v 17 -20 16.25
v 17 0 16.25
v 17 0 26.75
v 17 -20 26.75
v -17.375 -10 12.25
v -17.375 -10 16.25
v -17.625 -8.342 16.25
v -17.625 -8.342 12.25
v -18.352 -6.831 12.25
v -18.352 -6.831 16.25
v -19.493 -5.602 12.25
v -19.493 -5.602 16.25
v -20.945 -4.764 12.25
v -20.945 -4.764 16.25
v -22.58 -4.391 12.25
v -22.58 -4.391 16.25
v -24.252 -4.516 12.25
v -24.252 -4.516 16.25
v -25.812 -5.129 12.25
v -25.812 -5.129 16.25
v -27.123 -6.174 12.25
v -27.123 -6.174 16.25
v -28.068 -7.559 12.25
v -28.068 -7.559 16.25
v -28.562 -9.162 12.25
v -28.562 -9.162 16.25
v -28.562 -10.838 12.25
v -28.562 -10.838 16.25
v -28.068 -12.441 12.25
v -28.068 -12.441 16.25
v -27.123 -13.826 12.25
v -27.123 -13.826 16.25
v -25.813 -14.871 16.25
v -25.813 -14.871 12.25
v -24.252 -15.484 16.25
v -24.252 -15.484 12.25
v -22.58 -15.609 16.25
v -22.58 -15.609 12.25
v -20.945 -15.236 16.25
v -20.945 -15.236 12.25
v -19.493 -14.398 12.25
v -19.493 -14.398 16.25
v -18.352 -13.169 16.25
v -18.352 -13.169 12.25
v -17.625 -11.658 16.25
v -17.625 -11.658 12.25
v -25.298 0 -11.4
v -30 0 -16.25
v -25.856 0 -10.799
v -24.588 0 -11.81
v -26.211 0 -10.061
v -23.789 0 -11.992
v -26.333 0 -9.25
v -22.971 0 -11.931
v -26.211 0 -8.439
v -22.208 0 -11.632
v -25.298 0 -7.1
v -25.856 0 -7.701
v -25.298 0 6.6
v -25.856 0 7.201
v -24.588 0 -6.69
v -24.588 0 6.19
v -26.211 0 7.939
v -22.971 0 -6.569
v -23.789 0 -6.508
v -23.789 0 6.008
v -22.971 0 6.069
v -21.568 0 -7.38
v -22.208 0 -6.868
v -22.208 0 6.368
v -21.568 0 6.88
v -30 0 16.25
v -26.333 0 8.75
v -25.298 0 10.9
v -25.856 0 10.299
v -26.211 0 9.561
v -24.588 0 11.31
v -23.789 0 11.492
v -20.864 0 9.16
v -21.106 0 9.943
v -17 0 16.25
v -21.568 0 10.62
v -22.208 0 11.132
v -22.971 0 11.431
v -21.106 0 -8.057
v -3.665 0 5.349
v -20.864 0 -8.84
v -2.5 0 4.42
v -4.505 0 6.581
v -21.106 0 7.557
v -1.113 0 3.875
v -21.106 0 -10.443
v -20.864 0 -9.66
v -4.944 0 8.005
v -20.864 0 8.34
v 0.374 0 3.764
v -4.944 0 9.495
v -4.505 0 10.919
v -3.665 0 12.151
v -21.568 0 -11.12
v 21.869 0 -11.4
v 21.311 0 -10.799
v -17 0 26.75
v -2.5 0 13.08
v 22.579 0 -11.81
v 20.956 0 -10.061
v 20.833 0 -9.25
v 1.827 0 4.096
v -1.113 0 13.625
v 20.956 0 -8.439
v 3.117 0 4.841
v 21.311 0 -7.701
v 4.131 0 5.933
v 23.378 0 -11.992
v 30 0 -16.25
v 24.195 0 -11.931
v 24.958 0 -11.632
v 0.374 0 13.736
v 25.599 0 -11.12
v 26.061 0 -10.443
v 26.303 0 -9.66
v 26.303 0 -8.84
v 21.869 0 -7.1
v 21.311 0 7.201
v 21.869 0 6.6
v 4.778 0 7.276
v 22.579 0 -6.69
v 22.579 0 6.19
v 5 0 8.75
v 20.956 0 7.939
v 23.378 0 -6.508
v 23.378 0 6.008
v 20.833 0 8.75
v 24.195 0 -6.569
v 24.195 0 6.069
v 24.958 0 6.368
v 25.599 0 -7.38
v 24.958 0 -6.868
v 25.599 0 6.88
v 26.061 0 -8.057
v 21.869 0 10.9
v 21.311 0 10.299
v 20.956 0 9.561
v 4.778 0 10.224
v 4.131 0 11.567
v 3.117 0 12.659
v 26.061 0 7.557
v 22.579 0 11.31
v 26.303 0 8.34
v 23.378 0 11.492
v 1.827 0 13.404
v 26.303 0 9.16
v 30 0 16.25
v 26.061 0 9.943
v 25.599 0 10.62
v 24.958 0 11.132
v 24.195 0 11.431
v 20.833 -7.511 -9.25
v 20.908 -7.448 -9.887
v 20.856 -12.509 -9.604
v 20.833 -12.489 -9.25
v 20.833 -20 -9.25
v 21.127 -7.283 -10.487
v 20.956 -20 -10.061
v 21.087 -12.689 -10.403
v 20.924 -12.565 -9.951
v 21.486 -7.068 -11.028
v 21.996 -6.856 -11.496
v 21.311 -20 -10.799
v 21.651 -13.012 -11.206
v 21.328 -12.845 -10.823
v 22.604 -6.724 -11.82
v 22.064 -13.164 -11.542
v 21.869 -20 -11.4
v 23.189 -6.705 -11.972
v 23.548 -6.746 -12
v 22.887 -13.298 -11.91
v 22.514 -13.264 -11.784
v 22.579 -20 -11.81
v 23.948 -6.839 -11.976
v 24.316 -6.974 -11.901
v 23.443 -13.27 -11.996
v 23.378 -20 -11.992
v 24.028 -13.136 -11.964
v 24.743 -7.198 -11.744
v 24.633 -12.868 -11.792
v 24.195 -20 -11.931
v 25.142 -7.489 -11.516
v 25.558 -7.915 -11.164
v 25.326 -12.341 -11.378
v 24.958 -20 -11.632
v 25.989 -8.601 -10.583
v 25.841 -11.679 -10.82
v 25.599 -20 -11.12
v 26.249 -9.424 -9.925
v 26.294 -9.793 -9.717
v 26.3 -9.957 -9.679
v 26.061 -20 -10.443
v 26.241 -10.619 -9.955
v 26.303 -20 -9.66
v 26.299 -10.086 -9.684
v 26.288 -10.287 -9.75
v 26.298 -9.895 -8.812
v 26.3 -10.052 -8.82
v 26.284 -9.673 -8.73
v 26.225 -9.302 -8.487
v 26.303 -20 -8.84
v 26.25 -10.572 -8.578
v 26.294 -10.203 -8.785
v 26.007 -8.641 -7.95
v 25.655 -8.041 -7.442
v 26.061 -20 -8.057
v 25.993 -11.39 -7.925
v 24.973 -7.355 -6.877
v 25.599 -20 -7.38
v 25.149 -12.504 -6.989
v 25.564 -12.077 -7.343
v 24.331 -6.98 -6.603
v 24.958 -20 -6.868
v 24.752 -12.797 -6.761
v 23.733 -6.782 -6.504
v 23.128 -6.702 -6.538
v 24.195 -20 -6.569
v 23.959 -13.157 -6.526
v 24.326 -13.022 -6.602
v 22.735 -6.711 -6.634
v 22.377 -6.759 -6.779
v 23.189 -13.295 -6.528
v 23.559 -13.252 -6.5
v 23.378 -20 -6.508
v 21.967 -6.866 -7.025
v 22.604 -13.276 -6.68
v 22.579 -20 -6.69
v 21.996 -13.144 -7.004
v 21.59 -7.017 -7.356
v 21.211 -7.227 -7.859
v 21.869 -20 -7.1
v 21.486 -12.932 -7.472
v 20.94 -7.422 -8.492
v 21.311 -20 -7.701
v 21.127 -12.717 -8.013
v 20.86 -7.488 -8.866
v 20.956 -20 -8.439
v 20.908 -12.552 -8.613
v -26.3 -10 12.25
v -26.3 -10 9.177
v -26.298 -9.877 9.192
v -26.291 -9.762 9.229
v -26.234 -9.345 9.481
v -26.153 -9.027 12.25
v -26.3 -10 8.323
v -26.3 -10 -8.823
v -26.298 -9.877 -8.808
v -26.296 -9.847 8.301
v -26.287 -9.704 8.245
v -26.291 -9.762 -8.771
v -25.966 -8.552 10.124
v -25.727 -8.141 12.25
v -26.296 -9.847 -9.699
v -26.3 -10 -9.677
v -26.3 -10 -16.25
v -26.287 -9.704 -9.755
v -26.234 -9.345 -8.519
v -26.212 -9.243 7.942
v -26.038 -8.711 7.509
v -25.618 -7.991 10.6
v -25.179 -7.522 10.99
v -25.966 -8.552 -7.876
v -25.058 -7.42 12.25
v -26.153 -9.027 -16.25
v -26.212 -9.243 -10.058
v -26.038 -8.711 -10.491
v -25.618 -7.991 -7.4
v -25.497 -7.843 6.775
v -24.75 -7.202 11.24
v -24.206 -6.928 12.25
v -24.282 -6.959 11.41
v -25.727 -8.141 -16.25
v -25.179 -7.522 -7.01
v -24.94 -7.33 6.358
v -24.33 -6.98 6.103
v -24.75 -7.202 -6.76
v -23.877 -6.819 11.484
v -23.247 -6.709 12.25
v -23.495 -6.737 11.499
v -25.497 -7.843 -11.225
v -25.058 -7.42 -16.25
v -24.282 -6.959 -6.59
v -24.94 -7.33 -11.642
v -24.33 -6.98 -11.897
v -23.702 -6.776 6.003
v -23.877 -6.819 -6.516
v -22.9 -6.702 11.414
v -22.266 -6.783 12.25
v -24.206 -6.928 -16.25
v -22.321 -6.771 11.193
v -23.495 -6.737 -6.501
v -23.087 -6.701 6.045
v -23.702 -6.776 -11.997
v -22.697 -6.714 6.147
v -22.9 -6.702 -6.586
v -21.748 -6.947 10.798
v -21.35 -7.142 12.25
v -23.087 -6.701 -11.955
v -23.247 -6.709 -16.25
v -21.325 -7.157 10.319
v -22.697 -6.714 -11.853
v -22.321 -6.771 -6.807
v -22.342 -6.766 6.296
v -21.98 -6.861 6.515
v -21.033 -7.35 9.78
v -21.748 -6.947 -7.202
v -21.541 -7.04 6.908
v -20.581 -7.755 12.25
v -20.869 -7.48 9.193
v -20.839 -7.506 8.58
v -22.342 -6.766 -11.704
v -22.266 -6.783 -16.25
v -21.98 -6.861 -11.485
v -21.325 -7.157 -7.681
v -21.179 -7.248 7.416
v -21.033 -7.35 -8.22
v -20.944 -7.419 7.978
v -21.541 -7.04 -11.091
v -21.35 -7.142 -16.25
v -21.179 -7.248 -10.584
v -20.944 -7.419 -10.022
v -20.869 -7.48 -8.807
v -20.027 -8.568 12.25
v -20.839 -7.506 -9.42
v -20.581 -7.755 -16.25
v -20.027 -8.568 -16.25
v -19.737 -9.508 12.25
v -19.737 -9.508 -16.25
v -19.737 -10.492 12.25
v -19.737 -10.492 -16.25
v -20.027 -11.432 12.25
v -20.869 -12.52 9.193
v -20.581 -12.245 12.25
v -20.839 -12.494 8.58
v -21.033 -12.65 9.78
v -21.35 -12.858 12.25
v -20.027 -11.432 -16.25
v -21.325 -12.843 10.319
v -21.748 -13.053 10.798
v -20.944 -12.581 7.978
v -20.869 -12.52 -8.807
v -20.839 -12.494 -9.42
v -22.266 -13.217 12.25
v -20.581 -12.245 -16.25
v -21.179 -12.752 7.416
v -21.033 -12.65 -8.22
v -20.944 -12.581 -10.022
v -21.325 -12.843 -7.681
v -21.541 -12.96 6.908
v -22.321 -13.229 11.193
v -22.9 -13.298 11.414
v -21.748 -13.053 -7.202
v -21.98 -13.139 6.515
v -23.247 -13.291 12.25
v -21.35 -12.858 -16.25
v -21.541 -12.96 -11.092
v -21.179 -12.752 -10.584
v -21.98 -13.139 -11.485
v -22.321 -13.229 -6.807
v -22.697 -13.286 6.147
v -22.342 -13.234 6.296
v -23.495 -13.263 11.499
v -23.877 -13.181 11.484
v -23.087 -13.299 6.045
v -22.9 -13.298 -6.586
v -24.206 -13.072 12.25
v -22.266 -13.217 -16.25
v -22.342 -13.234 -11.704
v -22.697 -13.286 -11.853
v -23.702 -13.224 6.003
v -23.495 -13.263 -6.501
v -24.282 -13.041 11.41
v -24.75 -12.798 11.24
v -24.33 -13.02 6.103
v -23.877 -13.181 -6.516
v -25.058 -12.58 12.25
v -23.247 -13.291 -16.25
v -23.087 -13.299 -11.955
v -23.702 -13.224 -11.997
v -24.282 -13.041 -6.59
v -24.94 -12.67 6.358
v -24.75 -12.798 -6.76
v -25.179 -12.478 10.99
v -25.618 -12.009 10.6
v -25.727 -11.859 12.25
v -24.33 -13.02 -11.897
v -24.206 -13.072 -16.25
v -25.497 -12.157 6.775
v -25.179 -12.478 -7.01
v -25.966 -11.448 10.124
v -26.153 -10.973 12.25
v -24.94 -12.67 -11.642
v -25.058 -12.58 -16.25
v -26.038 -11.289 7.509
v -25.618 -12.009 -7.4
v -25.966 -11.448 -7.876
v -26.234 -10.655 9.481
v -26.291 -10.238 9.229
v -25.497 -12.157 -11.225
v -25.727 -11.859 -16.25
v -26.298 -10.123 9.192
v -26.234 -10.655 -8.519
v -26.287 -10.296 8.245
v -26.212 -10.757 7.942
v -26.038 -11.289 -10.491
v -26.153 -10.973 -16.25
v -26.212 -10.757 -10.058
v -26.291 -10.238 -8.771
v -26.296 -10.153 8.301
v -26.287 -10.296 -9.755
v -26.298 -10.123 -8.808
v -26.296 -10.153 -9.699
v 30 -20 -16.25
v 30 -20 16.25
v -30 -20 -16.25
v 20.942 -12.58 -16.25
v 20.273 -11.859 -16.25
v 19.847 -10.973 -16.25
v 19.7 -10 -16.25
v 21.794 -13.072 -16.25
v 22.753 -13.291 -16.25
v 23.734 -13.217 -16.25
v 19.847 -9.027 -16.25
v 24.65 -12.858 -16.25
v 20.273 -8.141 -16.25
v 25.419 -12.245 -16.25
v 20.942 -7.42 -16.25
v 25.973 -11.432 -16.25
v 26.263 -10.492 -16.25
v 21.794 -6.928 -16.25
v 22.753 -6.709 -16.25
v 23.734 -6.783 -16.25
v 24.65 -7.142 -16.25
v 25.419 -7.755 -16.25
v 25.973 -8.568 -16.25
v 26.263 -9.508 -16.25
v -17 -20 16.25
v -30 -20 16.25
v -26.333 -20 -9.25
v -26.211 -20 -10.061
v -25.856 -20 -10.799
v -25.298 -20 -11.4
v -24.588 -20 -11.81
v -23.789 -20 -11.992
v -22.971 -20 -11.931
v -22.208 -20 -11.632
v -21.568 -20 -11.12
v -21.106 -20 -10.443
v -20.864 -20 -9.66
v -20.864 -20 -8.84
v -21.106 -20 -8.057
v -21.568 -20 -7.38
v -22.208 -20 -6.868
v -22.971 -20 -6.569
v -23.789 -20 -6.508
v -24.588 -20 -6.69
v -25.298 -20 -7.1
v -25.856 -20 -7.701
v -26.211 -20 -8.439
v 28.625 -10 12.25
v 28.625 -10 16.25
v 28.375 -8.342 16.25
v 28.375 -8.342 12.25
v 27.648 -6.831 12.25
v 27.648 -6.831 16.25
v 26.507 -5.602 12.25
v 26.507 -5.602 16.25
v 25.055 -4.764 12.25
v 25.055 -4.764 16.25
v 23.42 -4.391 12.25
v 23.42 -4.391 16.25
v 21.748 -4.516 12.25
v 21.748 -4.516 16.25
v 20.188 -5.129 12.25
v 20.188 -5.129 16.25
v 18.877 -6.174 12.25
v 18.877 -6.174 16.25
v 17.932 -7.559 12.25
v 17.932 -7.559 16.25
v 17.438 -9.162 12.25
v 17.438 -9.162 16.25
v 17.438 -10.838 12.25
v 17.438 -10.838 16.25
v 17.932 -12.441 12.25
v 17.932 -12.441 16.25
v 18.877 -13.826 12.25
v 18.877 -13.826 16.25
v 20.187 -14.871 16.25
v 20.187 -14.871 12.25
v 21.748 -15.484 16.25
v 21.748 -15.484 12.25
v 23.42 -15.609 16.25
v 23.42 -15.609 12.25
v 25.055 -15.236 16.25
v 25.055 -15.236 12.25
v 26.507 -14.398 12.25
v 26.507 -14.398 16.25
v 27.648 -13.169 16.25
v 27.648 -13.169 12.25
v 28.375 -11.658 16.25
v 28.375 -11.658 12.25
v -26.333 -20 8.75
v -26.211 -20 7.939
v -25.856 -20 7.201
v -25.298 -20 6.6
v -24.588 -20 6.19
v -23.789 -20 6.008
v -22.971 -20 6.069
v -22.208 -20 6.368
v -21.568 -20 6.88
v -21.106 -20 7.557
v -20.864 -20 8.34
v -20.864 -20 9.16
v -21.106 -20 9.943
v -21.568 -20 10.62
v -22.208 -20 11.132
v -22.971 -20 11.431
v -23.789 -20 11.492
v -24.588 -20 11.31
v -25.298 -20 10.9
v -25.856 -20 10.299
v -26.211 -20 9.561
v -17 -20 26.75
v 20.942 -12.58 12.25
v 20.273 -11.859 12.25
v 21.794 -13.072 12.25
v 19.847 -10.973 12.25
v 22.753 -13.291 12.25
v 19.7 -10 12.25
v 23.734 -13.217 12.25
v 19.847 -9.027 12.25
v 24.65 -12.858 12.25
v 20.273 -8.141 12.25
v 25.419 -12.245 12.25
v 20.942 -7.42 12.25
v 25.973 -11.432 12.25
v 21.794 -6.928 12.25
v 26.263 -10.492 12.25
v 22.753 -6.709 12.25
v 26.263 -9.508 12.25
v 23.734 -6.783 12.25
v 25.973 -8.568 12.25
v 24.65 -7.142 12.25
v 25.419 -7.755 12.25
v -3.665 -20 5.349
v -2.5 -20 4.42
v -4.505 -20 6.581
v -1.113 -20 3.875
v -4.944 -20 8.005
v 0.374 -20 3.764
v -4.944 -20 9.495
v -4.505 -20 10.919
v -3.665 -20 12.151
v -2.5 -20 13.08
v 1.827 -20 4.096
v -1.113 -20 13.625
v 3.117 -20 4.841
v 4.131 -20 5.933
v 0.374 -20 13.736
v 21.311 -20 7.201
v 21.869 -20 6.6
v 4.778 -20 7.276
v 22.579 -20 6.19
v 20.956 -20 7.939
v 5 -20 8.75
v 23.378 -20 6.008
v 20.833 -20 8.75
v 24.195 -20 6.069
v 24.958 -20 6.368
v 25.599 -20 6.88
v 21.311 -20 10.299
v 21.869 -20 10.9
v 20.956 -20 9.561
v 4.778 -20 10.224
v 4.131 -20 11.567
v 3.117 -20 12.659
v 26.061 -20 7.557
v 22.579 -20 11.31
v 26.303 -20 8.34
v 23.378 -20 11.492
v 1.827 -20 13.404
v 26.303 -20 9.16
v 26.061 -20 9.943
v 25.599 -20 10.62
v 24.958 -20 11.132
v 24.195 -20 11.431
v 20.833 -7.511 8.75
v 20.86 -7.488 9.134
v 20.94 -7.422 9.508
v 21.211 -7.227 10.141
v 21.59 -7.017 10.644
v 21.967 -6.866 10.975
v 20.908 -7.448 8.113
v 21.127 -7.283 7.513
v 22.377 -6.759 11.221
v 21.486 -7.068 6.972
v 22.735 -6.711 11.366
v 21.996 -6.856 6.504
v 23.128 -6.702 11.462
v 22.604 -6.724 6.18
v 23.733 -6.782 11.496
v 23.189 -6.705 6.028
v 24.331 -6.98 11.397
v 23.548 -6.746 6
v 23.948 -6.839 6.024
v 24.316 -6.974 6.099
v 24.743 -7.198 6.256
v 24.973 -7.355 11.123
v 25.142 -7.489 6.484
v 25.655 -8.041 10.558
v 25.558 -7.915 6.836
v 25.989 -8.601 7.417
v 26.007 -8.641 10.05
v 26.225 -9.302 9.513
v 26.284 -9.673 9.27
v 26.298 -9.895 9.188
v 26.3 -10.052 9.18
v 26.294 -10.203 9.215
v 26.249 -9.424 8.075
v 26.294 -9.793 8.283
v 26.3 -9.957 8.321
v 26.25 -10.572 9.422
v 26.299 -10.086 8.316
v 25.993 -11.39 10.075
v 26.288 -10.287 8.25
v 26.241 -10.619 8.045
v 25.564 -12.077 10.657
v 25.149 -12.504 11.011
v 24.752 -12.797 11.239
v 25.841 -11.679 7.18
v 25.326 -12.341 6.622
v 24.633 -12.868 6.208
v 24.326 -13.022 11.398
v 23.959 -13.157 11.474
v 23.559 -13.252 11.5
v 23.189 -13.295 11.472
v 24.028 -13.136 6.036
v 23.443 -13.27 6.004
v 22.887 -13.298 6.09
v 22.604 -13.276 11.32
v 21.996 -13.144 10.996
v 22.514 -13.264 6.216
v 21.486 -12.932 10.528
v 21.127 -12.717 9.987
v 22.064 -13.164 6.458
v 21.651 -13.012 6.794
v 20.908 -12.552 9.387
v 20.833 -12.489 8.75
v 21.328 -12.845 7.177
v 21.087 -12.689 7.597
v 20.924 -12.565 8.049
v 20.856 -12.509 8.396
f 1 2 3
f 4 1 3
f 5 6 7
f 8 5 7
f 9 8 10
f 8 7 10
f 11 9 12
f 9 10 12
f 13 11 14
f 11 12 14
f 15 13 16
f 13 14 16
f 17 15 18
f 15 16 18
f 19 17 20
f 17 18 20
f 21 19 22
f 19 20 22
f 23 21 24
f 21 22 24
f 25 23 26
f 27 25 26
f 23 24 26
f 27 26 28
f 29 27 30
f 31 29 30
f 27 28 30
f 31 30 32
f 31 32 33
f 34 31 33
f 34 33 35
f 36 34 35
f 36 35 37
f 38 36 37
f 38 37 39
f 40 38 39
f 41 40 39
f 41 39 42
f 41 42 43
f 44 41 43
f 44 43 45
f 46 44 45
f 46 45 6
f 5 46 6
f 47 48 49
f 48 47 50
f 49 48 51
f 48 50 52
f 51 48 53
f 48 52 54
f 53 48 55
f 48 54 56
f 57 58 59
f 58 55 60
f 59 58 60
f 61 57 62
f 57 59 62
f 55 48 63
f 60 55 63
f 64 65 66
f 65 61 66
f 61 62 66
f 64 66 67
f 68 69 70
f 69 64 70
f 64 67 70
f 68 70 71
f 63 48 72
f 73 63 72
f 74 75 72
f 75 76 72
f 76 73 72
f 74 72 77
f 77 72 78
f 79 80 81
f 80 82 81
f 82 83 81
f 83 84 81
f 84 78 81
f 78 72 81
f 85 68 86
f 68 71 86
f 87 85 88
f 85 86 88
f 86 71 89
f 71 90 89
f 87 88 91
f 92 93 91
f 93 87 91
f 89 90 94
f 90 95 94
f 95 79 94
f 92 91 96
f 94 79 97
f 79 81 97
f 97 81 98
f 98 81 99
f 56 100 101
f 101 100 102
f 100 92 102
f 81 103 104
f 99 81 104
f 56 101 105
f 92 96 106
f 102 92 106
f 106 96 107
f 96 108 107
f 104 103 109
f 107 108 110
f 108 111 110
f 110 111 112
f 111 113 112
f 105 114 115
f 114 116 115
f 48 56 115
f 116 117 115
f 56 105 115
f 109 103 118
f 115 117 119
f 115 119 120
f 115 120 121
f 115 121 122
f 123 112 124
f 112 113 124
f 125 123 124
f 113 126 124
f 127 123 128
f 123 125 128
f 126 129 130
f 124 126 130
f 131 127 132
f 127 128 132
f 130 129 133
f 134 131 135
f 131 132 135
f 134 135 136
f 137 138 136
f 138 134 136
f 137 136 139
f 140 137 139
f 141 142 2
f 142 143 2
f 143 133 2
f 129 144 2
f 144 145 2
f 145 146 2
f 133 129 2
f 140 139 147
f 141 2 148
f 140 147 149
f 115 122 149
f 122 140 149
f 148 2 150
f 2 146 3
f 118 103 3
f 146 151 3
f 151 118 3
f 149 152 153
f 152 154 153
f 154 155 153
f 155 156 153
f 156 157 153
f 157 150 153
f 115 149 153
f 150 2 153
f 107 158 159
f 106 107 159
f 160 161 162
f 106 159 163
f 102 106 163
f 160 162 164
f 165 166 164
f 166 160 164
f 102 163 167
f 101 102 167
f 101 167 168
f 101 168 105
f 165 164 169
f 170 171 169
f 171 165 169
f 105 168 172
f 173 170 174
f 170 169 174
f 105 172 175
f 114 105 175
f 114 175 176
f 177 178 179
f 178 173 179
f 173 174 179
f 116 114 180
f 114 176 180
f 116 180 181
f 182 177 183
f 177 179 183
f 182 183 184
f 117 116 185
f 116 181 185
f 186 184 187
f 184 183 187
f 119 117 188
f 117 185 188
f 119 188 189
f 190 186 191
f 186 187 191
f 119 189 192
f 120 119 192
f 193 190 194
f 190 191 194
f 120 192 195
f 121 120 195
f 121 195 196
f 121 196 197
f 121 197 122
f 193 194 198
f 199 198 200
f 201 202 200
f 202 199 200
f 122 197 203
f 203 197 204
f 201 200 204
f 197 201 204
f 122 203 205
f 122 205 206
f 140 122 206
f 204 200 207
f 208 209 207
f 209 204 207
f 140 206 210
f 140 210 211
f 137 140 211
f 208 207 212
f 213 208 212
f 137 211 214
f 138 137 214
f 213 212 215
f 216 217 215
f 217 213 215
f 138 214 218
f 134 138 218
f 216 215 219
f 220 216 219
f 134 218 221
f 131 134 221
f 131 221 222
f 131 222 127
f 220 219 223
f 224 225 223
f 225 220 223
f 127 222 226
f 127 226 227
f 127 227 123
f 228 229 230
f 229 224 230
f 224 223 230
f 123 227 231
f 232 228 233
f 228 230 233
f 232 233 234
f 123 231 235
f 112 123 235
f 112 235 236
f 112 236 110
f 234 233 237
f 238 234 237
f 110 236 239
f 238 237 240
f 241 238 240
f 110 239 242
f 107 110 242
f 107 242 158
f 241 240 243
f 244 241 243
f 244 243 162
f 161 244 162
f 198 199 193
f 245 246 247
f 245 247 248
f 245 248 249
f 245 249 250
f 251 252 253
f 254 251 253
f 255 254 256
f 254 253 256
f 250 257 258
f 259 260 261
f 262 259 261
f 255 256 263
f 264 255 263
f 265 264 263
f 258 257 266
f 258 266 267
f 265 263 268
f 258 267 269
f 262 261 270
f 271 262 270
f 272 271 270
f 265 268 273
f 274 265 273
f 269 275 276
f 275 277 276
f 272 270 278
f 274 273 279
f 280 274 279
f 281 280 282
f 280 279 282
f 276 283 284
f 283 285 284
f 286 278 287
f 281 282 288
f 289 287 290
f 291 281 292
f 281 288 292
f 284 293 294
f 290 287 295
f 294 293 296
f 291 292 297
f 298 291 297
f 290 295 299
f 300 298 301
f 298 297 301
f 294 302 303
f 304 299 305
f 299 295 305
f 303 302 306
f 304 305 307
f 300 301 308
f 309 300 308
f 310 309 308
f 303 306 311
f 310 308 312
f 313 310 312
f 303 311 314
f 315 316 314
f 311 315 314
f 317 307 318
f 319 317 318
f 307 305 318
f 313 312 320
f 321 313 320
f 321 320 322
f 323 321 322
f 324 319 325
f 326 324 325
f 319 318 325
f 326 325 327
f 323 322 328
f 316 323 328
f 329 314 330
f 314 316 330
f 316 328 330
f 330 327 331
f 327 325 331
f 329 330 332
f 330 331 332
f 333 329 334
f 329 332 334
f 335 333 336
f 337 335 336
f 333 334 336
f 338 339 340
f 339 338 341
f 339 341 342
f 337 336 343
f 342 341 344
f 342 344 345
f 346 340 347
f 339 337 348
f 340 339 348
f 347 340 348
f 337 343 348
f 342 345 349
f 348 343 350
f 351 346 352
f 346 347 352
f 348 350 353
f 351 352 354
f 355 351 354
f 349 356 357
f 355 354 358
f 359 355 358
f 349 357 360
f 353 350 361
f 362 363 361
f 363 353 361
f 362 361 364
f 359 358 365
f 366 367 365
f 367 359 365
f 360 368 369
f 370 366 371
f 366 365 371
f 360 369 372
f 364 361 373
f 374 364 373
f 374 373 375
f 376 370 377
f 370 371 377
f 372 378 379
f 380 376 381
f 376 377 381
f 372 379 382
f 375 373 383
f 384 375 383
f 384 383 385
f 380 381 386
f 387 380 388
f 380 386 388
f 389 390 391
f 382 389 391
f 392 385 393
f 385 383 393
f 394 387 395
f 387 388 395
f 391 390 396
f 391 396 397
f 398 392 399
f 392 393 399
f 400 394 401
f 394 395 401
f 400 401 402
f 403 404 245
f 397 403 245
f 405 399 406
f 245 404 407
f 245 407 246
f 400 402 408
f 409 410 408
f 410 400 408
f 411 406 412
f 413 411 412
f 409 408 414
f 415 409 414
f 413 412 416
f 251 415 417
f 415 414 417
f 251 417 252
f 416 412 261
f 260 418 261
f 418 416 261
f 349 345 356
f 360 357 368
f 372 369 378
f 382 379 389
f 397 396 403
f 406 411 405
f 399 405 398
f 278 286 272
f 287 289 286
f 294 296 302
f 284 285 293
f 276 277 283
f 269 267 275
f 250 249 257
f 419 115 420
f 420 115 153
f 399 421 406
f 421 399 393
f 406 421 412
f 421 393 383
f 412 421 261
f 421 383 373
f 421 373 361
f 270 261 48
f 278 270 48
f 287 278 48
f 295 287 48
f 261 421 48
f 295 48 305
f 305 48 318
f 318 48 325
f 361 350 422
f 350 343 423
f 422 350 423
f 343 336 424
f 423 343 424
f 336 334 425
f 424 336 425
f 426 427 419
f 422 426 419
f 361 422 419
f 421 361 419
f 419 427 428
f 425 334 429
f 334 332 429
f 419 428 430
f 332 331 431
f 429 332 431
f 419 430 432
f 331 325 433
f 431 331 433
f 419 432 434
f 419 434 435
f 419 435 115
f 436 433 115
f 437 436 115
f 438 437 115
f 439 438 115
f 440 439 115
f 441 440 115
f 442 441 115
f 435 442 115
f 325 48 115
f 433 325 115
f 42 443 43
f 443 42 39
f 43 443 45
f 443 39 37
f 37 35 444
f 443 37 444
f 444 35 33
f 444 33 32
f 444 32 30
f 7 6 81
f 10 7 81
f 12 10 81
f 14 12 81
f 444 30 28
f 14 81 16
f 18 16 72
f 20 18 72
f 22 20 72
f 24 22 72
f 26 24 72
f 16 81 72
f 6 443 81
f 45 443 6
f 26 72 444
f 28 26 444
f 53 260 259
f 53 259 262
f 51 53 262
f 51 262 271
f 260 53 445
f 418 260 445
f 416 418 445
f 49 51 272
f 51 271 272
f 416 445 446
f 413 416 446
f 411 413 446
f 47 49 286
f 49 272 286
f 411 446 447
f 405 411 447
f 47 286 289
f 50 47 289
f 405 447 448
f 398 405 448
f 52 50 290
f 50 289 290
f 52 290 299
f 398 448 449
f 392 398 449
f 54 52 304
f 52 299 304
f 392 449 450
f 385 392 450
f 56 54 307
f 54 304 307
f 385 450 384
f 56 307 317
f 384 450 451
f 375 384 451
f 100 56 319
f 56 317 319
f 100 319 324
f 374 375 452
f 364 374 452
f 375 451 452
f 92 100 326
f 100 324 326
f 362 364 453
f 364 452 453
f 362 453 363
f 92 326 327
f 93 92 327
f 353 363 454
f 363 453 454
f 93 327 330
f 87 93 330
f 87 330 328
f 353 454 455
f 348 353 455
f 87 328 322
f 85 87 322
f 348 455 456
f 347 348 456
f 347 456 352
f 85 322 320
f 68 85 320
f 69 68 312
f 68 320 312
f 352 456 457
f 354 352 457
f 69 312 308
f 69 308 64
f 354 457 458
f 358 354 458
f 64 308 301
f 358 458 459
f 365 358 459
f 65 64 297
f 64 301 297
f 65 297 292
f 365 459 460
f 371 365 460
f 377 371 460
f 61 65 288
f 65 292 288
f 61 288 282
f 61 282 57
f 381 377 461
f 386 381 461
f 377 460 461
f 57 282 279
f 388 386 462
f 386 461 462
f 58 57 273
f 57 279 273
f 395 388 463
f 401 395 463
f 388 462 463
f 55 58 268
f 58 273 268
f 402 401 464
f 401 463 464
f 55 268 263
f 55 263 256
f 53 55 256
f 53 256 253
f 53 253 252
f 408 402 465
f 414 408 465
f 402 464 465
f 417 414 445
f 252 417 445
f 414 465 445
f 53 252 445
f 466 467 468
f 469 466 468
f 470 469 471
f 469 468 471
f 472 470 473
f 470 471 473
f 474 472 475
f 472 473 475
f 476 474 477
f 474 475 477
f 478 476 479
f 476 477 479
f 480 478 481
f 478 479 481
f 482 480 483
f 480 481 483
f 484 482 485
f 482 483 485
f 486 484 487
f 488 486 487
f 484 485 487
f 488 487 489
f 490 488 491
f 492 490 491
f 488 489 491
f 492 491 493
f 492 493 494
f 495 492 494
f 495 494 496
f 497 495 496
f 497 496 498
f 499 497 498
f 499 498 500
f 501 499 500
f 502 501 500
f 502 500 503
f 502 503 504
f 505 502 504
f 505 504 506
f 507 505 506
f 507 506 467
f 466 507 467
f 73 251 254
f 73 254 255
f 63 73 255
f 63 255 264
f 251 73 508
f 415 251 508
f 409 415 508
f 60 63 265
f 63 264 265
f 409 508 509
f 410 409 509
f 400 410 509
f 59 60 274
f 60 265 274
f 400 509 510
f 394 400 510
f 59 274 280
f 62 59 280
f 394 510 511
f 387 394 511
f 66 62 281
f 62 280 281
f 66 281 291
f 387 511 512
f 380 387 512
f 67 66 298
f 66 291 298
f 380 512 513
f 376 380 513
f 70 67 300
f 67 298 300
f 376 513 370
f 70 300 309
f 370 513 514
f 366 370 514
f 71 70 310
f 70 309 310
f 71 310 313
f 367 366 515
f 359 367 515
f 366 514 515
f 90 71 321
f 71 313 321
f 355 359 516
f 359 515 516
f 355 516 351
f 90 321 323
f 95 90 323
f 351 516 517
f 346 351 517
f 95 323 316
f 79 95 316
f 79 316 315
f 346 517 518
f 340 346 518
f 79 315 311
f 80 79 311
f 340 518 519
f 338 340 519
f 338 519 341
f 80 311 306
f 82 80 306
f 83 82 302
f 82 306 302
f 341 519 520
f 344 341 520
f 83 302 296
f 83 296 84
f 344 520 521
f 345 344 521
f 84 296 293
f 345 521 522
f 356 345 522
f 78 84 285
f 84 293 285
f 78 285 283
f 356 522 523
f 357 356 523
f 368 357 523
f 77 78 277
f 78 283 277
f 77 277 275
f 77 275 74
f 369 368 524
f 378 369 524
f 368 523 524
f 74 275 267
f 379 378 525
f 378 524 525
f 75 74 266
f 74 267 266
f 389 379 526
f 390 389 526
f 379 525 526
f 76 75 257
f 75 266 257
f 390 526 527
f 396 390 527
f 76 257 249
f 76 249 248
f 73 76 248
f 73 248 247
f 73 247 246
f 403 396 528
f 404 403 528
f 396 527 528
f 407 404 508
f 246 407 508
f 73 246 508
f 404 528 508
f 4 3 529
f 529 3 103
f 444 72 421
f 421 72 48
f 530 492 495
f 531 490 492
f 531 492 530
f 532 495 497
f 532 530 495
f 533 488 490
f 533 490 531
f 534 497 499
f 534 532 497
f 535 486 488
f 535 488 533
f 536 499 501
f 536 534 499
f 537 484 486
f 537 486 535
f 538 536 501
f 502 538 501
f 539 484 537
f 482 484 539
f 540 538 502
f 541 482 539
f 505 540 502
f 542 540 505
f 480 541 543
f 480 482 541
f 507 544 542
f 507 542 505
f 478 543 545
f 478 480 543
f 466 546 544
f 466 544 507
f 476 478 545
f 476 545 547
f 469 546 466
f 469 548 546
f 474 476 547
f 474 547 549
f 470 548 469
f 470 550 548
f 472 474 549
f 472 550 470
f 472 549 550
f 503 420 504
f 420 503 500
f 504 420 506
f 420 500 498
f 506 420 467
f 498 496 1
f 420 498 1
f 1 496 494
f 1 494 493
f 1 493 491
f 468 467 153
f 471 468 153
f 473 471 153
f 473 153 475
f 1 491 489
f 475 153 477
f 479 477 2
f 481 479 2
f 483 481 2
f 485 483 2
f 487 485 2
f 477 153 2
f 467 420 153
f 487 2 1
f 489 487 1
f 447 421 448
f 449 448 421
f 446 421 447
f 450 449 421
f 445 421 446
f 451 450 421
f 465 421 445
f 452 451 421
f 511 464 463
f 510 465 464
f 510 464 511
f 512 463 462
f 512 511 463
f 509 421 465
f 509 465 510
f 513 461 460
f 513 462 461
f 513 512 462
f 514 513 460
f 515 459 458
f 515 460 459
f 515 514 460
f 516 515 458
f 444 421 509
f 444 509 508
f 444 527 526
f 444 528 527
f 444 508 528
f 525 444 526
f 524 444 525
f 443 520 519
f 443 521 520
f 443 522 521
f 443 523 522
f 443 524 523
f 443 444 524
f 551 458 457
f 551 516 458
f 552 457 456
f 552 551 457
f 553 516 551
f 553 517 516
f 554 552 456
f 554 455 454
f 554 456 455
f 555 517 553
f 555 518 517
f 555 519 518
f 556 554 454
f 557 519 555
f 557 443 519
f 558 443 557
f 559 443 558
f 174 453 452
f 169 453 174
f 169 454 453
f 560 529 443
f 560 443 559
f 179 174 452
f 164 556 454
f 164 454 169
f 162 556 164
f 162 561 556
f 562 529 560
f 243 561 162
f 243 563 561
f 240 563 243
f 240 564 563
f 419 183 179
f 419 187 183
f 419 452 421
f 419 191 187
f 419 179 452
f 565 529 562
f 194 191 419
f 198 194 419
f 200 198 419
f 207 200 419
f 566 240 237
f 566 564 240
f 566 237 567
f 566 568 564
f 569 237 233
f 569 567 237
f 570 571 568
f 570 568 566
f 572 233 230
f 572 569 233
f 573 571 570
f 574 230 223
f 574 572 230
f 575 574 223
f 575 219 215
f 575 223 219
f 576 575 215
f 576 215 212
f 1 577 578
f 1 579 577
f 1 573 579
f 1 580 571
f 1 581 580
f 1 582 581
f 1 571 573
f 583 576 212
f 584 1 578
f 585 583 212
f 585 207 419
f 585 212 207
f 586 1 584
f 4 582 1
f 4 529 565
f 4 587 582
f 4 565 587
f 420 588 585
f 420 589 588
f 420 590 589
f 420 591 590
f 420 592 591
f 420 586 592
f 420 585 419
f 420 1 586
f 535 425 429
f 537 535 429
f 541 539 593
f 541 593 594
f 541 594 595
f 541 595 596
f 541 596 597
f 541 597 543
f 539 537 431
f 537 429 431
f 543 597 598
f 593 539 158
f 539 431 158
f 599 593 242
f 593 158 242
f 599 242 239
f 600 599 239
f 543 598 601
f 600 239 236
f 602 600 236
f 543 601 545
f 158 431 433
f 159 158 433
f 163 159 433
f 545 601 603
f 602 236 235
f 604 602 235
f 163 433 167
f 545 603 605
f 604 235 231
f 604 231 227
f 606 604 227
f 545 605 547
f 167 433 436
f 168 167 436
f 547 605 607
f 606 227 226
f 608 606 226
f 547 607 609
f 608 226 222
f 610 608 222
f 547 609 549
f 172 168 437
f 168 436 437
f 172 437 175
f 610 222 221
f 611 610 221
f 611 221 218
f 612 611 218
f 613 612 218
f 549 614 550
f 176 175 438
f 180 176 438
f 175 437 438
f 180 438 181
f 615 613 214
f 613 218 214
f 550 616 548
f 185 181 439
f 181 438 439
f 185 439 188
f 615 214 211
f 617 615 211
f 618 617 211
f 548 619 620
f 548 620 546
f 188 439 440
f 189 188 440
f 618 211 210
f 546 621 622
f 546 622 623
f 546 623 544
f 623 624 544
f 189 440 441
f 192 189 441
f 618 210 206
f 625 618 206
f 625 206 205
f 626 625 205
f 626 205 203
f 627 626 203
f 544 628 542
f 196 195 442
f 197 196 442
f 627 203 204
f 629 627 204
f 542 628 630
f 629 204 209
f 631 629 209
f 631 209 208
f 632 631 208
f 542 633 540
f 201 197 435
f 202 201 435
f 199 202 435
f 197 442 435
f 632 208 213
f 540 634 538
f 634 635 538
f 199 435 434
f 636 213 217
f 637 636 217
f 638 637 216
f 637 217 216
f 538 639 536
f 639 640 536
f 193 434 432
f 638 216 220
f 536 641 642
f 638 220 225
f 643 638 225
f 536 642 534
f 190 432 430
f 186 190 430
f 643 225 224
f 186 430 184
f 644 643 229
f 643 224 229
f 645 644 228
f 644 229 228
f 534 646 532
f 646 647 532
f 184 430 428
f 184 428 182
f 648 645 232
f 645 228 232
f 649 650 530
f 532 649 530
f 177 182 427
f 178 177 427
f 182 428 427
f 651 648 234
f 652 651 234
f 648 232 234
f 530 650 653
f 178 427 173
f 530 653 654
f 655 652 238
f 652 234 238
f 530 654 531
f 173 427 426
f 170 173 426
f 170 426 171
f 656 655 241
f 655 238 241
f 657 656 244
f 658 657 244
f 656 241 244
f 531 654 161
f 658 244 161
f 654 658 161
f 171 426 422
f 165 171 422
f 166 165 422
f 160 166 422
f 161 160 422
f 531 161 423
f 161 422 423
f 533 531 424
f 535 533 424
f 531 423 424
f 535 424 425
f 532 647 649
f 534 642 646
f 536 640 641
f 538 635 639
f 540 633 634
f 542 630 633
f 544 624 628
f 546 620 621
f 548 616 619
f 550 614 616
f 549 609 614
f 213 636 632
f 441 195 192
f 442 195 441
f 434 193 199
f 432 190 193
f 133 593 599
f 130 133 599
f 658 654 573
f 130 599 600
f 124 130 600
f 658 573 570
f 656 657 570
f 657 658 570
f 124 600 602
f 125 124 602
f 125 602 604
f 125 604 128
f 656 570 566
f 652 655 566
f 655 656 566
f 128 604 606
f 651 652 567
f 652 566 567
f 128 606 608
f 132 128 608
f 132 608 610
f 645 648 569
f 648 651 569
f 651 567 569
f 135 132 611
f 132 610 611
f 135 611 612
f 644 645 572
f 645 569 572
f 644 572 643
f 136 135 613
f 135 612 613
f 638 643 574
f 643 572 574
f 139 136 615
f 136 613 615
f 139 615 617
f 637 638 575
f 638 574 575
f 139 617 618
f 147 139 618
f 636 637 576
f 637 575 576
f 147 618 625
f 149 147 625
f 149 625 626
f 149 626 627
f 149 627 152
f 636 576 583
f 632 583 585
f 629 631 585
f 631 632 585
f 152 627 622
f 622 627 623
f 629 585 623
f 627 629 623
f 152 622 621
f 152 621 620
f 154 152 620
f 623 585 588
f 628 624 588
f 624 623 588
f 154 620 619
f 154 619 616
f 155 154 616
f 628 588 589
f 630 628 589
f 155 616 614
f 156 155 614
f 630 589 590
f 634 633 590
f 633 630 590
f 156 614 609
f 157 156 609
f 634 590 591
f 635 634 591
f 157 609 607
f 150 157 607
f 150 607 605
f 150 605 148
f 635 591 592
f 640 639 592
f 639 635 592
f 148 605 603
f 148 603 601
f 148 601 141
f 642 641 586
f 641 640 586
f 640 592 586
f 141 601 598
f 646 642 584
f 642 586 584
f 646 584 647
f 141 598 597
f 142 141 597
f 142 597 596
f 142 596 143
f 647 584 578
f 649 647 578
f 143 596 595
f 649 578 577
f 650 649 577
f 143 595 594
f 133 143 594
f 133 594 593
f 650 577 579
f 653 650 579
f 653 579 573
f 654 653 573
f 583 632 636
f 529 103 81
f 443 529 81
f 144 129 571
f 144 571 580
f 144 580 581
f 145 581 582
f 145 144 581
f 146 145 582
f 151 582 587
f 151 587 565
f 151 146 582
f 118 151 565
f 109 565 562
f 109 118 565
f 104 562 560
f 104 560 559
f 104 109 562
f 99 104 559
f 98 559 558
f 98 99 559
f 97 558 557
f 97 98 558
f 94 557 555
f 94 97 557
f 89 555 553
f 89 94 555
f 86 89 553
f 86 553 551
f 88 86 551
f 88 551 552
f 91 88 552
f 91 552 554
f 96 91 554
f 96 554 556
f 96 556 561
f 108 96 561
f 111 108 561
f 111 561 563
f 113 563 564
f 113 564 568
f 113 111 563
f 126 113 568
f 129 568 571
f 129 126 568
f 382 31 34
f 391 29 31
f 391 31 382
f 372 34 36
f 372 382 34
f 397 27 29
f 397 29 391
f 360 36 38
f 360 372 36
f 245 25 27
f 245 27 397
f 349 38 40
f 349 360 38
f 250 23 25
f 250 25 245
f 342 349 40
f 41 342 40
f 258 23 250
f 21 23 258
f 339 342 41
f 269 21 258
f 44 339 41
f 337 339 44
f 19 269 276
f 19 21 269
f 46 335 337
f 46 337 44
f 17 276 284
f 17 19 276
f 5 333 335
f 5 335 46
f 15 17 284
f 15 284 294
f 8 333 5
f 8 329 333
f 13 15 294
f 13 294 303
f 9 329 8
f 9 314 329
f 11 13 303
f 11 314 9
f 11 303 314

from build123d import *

# Parameters (mm, degrees)
F0_R           = 5
F1_DEPTH       = 20
F3_D           = 6.6
F3_CBORE_D     = 11.25
F3_CBORE_DEPTH = 4
F4_D           = 5.5


with BuildPart() as f1:
    # F0 (on Front) → F1 (new body)
    with BuildSketch(Plane.XZ):
        Polygon((30, -16.25), (30, 16.25), (17, 16.25), (17, 26.75), (-17, 26.75), (-17, 16.25), (-30, 16.25), (-30, -16.25), align=None)
        with Locations((0, 8.75)):
            Circle(F0_R, mode=Mode.SUBTRACT)
    extrude(amount=F1_DEPTH)

    # F3 (through all)
    with Locations(Plane.XY.offset(16.25)):
        with Locations((-23, -10), (23, -10)):
            CounterBoreHole(F3_D / 2, F3_CBORE_D / 2, F3_CBORE_DEPTH)

    # F4 (through all)
    with Locations(Plane(origin=(0, 0, 0), x_dir=(1, 0, 0), z_dir=(0, 1, 0))):
        with Locations((23.5833972692, -8.75), (23.5833972692, 9.25), (-23.5833972692, 9.25), (-23.5833972692, -8.75)):
            Hole(F4_D / 2)


solid = f1.part
